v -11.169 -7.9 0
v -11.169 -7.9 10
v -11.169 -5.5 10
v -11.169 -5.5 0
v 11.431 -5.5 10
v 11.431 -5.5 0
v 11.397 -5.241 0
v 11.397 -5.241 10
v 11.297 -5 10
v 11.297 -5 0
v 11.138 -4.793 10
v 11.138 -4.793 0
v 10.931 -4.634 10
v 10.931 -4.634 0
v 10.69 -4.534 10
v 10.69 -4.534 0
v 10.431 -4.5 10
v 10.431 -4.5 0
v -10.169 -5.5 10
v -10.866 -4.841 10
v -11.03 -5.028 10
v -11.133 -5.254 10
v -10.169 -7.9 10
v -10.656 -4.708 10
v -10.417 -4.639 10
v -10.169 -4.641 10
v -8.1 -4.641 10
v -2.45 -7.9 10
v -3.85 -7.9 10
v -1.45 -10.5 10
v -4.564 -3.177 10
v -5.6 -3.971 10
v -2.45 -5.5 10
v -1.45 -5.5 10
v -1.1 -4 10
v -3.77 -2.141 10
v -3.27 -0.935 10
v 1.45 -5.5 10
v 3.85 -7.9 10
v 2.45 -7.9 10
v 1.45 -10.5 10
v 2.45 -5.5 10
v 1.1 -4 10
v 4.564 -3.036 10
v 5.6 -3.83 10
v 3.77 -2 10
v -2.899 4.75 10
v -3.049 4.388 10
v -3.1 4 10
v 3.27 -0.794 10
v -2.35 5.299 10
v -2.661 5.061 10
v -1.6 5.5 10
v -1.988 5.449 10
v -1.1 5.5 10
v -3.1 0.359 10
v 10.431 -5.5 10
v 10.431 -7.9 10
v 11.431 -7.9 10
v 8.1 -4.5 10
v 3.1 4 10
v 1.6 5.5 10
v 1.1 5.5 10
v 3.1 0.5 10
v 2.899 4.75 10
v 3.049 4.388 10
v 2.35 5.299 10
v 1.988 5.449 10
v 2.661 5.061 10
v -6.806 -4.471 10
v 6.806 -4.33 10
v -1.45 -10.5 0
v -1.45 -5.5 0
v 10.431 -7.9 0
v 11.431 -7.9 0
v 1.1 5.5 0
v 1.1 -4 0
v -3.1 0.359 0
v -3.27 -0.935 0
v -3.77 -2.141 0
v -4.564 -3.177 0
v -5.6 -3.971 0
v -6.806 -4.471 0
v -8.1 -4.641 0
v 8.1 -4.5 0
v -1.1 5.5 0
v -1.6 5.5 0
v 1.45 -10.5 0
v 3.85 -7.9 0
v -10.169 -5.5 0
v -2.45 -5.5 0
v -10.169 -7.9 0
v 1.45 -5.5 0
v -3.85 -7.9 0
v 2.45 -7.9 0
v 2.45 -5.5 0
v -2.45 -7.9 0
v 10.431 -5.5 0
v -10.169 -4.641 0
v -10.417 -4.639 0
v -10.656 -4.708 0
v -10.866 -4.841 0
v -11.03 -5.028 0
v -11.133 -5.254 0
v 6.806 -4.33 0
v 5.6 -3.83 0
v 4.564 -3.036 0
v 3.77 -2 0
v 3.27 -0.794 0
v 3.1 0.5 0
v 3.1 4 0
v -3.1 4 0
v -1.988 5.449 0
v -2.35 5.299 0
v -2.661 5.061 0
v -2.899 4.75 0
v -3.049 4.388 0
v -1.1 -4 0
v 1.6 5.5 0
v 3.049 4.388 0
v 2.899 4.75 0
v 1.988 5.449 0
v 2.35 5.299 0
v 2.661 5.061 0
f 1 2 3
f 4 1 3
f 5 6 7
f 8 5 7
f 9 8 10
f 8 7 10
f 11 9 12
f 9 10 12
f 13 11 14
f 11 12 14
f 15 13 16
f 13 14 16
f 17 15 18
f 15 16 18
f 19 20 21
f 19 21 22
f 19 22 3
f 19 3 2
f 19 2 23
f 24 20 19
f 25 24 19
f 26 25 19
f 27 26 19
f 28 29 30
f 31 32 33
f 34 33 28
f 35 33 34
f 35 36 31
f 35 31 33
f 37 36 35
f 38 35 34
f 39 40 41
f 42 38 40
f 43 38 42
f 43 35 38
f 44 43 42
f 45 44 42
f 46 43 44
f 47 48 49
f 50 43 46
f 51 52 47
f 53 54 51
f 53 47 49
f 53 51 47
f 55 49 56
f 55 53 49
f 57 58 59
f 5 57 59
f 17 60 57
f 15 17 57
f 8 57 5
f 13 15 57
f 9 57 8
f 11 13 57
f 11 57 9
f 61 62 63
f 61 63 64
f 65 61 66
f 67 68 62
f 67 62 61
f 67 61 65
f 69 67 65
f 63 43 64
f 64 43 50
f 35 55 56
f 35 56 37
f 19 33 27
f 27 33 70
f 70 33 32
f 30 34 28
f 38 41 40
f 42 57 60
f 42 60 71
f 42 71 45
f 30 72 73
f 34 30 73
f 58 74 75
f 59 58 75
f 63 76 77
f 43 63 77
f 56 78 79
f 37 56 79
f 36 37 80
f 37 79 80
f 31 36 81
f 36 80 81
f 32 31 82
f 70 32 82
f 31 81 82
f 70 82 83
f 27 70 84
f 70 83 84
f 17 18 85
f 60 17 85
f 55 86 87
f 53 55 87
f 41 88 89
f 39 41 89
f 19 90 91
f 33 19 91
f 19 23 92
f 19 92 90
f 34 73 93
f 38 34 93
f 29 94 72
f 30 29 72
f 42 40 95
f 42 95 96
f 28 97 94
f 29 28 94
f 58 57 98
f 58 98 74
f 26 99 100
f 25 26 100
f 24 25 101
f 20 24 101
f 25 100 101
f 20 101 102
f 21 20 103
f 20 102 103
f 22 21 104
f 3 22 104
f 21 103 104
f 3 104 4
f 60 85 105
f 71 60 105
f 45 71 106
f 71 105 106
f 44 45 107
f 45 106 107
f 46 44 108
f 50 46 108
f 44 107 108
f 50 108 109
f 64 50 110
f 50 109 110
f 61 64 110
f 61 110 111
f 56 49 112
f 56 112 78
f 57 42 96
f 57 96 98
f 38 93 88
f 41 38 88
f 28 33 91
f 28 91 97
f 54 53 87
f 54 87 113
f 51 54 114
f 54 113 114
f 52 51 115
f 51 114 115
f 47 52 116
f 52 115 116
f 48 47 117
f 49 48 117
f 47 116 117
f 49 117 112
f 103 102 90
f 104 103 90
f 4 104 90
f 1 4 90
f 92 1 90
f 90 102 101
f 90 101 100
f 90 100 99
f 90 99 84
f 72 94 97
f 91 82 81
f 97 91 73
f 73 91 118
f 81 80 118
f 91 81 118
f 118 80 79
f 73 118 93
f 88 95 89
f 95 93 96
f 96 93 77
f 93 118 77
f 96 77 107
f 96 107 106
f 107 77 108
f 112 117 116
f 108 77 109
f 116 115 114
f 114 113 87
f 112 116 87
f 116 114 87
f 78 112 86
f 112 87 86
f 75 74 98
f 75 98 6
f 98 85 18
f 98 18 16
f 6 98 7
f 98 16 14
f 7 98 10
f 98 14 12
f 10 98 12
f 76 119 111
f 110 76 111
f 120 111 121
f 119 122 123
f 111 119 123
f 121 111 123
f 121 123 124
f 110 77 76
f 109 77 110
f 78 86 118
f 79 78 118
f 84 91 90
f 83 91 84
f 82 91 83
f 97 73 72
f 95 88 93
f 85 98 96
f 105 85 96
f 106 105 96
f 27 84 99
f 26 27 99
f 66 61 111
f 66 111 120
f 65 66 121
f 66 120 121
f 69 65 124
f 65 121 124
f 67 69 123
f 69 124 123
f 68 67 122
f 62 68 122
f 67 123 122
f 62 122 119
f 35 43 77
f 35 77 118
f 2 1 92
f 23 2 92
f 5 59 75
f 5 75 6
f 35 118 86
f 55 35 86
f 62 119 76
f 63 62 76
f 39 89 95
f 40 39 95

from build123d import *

# Parameters (mm, degrees)
F0_W     = 1
F0_H     = 2.4
F1_DEPTH = 10


# Not quite as in the source:
# - a feature names something its author has since deleted; it is built from what else it names


with BuildPart() as f1:
    # F0 (on Top) → F1 (new body)
    with BuildSketch(Plane.XY):
        with Locations((10.9311291858, -6.7)):
            Rectangle(F0_W, F0_H)
        with Locations((-10.6688708142, -6.7)):
            Rectangle(F0_W, F0_H)
        Polygon((-2.45, -8.5), (-2.45, -7.9), (-3.85, -7.9), (-1.45, -10.5), (-1.45, -8.5), align=None)
        with BuildLine():
            Line((-11.1688708142, -5.5), (-10.1688708142, -5.5))
            Line((-10.1688708142, -5.5), (-10.1688708142, -4.6410811281))
            ThreePointArc((-10.1688708142, -4.6410811281), (-10.8661281522, -4.8408828578), (-11.1688708142, -5.5))
        make_face()
        with BuildLine():
            Line((10.4311291858, -4.5), (10.4311291858, -5.5))
            Line((10.4311291858, -5.5), (11.4311291858, -5.5))
            ThreePointArc((11.4311291858, -5.5), (11.1382359669, -4.7928932188), (10.4311291858, -4.5))
        make_face()
        Polygon((-1.45, -5.5), (-2.45, -5.5), (-2.45, -7.9), (-2.45, -8.5), (-1.45, -8.5), align=None)
        Polygon((2.45, -5.5), (1.45, -5.5), (1.45, -8.5), (2.45, -8.5), (2.45, -7.9), align=None)
        with BuildLine():
            Line((-10.1688708142, -4.6410811281), (-10.1688708142, -5.5))
            Line((-10.1688708142, -5.5), (-2.45, -5.5))
            Line((-2.45, -5.5), (-1.45, -5.5))
            Line((-1.45, -5.5), (1.45, -5.5))
            Line((1.45, -5.5), (2.45, -5.5))
            Line((2.45, -5.5), (10.4311291858, -5.5))
            Line((10.4311291858, -5.5), (10.4311291858, -4.5))
            Line((10.4311291858, -4.5), (8.1, -4.5))
            ThreePointArc((8.1, -4.5), (4.5644660941, -3.0355339059), (3.1, 0.5))
            Line((3.1, 0.5), (3.1, 4))
            ThreePointArc((3.1, 4), (2.6606601718, 5.0606601718), (1.6, 5.5))
            Line((1.6, 5.5), (1.1, 5.5))
            Line((1.1, 5.5), (1.1, -4))
            Line((1.1, -4), (-1.1, -4))
            Line((-1.1, -4), (-1.1, 5.5))
            Line((-1.1, 5.5), (-1.6, 5.5))
            ThreePointArc((-1.6, 5.5), (-2.6606601718, 5.0606601718), (-3.1, 4))
            Line((-3.1, 4), (-3.1, 0.3589188719))
            ThreePointArc((-3.1, 0.3589188719), (-4.5644660941, -3.176615034), (-8.1, -4.6410811281))
            Line((-8.1, -4.6410811281), (-10.1688708142, -4.6410811281))
        make_face()
        Polygon((2.45, -8.5), (1.45, -8.5), (1.45, -10.5), (3.85, -7.9), (2.45, -7.9), align=None)
    extrude(amount=F1_DEPTH)


solid = f1.part
